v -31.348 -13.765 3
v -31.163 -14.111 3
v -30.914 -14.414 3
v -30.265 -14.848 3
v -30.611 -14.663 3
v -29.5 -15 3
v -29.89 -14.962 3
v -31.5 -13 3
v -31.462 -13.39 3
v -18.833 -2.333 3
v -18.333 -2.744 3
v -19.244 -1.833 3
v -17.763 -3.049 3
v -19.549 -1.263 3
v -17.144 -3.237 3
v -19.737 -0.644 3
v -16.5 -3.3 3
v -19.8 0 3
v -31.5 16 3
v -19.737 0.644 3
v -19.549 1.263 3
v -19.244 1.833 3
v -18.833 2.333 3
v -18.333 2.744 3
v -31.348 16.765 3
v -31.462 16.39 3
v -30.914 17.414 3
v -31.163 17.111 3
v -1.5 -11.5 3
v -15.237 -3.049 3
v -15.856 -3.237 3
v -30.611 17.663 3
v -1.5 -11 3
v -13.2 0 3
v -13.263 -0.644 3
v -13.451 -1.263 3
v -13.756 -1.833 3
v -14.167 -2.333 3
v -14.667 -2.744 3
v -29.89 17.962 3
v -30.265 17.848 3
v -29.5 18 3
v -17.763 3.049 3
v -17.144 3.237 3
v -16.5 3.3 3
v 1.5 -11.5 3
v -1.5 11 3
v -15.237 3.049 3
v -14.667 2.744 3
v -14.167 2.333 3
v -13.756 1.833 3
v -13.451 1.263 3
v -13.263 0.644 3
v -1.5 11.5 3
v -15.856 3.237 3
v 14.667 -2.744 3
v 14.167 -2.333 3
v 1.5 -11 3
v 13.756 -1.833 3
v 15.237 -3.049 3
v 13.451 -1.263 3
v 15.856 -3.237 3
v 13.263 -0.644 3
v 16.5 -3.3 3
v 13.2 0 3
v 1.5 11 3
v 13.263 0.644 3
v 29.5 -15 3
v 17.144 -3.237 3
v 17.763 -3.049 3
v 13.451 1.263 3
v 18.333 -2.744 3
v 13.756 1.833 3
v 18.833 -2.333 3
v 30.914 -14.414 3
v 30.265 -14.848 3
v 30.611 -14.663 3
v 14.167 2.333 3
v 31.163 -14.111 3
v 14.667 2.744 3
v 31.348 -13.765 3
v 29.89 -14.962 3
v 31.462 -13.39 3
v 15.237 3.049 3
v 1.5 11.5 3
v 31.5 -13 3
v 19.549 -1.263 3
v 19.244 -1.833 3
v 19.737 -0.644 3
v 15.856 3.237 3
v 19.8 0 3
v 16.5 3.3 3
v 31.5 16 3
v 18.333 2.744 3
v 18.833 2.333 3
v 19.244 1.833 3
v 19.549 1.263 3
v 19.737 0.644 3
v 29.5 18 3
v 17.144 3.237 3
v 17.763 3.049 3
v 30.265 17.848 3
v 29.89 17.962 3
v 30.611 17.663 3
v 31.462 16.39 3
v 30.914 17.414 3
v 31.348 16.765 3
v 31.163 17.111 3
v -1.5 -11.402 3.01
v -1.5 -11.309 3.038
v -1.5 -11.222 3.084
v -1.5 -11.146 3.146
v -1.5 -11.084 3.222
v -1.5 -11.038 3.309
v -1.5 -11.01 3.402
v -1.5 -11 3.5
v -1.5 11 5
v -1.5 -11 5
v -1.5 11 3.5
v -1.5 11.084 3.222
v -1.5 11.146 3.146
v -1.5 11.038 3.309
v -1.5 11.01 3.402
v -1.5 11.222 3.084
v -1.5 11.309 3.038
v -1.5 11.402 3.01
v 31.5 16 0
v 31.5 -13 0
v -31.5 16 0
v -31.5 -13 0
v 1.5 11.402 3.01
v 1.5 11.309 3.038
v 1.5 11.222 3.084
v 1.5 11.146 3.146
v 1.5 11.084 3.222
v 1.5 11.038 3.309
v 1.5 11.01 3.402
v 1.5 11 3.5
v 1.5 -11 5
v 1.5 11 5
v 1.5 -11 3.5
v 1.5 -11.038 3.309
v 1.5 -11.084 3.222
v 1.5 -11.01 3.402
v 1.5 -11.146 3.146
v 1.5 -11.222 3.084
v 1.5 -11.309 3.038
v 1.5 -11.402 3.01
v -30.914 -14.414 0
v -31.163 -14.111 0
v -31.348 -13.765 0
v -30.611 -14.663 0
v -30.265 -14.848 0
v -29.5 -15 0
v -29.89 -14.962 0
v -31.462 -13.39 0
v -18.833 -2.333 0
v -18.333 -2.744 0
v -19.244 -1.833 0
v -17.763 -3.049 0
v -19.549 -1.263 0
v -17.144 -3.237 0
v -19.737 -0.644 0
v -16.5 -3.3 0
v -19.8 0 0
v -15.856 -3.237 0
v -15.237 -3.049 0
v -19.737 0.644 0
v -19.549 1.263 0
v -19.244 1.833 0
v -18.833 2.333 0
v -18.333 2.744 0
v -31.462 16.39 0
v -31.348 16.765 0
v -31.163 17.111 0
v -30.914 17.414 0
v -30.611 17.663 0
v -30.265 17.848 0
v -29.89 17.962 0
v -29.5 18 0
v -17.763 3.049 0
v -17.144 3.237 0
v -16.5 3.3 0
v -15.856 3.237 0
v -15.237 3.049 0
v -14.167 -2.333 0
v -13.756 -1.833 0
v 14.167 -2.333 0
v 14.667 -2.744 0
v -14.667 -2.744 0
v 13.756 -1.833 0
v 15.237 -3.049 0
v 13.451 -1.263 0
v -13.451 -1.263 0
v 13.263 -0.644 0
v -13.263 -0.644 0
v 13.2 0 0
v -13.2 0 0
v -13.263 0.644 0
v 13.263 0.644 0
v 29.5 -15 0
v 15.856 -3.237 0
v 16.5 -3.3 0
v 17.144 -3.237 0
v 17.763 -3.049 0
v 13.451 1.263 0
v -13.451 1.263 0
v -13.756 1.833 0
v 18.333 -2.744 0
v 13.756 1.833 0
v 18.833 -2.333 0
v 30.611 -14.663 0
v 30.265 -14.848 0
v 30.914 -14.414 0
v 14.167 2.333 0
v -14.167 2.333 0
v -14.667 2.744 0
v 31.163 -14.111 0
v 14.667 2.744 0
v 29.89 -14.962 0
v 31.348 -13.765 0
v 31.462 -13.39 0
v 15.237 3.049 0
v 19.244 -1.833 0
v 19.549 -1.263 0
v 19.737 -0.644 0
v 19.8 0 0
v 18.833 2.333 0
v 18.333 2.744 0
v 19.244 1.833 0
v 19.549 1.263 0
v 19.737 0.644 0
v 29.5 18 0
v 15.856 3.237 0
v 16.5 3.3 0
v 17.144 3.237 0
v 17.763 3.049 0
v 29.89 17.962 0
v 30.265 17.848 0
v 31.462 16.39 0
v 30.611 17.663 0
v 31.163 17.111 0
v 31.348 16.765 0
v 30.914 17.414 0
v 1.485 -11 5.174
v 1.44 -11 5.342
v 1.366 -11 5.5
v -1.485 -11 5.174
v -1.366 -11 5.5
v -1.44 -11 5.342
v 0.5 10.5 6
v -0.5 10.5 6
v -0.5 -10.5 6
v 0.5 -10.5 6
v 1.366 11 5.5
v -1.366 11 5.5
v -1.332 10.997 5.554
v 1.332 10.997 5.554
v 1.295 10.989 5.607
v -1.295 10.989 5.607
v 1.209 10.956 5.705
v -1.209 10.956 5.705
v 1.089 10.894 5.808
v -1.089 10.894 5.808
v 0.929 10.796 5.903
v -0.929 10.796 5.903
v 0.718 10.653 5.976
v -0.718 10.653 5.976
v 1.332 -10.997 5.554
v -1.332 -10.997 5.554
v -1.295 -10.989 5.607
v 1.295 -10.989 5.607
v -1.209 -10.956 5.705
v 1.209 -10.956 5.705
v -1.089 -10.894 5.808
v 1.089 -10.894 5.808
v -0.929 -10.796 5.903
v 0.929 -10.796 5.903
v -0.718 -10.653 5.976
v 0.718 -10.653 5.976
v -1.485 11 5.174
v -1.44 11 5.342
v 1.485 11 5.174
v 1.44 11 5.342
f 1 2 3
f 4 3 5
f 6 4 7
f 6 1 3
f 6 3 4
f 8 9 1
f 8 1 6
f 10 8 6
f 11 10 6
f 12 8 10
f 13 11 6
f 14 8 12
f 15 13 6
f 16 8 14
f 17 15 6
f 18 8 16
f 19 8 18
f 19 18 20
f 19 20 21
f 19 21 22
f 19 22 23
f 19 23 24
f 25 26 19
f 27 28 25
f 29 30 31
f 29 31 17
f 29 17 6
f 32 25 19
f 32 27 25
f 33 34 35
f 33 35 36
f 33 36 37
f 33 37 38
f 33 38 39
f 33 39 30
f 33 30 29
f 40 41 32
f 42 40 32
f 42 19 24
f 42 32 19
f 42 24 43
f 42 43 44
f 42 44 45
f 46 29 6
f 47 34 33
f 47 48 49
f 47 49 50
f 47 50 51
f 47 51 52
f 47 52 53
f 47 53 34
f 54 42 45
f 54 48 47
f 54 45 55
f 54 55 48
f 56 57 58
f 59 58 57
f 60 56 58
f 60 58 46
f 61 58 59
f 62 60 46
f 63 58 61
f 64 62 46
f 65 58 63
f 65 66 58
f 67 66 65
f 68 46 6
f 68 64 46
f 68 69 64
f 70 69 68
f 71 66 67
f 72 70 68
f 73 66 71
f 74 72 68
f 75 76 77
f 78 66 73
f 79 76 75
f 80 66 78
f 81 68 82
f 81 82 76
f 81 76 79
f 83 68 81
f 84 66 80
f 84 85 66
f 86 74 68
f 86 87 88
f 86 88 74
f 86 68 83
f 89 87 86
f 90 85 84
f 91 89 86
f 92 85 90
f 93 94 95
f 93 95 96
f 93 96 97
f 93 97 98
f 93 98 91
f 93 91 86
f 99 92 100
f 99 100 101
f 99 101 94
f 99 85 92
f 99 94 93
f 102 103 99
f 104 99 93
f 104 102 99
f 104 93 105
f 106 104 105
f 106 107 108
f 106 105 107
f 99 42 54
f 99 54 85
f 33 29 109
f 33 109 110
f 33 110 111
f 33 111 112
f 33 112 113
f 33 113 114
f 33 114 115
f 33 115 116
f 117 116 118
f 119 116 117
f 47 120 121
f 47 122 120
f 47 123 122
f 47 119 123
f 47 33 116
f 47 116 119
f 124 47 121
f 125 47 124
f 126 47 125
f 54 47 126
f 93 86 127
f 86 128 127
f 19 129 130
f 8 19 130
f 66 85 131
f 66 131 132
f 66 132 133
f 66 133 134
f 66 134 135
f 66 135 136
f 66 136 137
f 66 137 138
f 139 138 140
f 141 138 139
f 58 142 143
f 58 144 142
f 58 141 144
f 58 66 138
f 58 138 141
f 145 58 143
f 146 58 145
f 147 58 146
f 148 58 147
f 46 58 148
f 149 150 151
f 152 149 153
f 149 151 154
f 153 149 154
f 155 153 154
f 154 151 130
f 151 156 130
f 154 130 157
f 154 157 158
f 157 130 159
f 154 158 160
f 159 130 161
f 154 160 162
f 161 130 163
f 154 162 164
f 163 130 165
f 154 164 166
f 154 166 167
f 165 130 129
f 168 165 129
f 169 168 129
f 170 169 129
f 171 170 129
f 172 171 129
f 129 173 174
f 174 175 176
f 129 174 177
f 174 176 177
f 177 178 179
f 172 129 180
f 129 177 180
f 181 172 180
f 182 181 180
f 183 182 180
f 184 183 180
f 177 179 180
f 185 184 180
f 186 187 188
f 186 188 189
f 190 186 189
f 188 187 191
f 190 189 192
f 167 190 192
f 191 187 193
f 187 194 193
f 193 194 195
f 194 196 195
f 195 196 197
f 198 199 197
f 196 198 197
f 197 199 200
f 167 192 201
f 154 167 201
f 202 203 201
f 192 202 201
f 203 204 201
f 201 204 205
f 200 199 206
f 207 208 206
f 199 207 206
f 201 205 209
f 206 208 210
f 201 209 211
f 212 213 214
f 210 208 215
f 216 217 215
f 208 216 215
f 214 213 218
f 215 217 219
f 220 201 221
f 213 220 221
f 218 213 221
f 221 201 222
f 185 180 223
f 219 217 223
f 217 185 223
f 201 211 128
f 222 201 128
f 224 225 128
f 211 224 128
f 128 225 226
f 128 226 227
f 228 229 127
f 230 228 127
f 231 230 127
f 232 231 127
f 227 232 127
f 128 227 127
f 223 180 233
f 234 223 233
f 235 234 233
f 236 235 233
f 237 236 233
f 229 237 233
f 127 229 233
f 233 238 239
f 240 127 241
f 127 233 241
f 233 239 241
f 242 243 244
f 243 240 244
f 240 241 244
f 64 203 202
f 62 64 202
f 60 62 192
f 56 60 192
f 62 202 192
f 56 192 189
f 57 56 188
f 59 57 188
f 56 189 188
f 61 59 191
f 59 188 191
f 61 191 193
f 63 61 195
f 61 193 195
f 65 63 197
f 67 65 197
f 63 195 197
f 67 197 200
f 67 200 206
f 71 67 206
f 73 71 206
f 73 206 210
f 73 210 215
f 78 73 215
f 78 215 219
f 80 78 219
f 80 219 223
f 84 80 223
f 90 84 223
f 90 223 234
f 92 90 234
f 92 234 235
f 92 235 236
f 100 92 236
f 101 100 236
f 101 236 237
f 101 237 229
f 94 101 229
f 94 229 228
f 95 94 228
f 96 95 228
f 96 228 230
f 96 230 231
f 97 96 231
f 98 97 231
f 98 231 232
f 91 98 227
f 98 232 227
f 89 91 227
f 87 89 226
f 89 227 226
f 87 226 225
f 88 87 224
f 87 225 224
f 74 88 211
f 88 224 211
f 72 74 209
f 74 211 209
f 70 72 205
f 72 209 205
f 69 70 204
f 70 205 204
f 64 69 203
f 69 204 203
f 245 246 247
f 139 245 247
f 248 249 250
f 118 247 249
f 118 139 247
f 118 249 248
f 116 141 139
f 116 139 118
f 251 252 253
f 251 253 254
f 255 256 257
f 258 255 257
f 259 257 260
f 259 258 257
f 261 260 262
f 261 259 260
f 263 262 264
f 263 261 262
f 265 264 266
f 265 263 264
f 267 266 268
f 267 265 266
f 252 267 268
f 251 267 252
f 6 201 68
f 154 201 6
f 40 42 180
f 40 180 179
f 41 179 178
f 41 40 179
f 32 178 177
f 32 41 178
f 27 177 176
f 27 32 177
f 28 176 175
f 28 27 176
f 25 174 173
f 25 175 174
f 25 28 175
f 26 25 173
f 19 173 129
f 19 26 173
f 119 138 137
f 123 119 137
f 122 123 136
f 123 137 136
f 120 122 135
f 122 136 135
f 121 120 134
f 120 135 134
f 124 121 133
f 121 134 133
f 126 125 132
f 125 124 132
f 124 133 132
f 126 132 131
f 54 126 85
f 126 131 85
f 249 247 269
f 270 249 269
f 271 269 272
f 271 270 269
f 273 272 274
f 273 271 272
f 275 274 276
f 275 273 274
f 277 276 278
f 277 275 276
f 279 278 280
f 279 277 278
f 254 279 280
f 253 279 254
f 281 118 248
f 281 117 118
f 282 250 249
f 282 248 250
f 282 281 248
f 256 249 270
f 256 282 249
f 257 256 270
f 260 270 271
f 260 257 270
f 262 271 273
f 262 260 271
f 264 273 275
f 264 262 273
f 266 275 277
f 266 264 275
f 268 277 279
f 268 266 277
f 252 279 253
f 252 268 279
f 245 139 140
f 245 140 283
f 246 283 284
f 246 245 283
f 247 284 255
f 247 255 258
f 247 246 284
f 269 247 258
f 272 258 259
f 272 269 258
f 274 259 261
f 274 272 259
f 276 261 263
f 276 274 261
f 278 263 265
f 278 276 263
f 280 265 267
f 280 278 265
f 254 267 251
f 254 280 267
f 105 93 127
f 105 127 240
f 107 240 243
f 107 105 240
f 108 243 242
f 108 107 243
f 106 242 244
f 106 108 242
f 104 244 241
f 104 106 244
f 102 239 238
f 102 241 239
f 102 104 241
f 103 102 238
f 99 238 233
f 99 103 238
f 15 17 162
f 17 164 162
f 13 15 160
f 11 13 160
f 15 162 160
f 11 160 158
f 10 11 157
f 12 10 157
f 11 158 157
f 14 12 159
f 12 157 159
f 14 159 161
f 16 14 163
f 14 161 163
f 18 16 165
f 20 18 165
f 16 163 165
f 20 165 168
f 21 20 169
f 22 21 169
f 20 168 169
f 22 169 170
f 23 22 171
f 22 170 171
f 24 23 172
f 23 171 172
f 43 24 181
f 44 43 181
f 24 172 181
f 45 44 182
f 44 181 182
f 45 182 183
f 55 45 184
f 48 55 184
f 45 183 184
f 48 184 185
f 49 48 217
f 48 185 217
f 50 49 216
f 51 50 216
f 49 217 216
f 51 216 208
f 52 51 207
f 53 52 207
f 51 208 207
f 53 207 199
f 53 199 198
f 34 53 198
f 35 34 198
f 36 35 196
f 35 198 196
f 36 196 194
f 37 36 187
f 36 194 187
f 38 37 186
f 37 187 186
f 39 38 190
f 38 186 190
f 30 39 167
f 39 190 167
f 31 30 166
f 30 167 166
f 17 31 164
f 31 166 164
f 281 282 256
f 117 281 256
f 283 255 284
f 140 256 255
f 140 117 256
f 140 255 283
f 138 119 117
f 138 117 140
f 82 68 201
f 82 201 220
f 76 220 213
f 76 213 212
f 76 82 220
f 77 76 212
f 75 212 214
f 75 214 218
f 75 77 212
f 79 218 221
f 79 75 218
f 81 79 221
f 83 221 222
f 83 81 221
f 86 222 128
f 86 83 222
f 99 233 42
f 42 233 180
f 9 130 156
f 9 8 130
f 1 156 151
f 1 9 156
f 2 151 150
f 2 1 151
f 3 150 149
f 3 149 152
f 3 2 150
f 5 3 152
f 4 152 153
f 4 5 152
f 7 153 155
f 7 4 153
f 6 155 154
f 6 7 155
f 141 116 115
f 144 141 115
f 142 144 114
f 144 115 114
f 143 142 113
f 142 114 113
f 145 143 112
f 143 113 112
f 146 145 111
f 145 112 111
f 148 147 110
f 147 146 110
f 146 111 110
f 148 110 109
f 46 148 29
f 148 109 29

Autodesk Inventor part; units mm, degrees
ref_plane "YZ Plane" through (0, 0, 0) normal (1, 0, 0) x (0, 1, 0)
ref_plane "XZ Plane" through (0, 0, 0) normal (0, 1, 0) x (-1, 0, 0)
ref_plane "XY Plane" through (0, 0, 0) normal (0, 0, 1) x (1, 0, 0)
sketch "スケッチ2" plane through (0, 0, 0) normal (0, 0, 1) x (1, 0, 0)
  line L0 (-31.5, 15) -> (31.5, 15)
  line L1 (31.5, 15) -> (31.5, -15)
  line L2 (31.5, -15) -> (-31.5, -15)
  line L3 (-31.5, -15) -> (-31.5, 15)
  line L4 (0, 24.6) -> (0, -21.6) construction
  line L5 (-44.1, 0) -> (44.1, 0) construction
  line L6 (-31.5, 15) -> (31.5, 15)
  line L7 (31.5, 15) -> (31.5, 18)
  line L8 (31.5, 18) -> (-31.5, 18)
  line L9 (-31.5, 18) -> (-31.5, 15)
  point P0 (0, 0)
  point P1 (31.5, 15)
  dimension "d1" = 63
  dimension "d2" = 30
  dimension "d3" = 15
  dimension "d4" = 31.5
  dimension "d26" = 3
extrude "押し出し1" add sketch "スケッチ2" along normal blind 3
sketch "スケッチ3" plane through (0, 0, 3) normal (0, 0, 1) x (1, 0, 0)
  line L0 (-31.5, -15) -> (31.5, -15) construction
  line L1 (-44.1, 0) -> (44.1, 0) construction
  line L2 (31.5, -15) -> (31.5, 18) projected
  line L3 (31.5, 18) -> (-31.5, 18) projected
  line L4 (-31.5, 18) -> (-31.5, -15) projected
  point P0 (0, 0)
  point P1 (-16.5, 0)
  point P2 (16.5, 0)
hole "穴1" at (-16.5, 0, 3) at (16.5, 0, 3) direction (0, 0, -1) diameter 6.6 end through all
fillet "フィレット1" radius 2 4 edges at (31.5, -15, 1.5) (-31.5, -15, 1.5) (-31.5, 18, 1.5) (31.5, 18, 1.5)
sketch "スケッチ4" plane through (0, 0, 3) normal (0, 0, 1) x (1, 0, 0)
  line L0 (-29.5, -15) -> (29.5, -15) projected
  arc A0 (-31.5, -13) -> (-29.5, -15) centre (-29.5, -13) ccw projected
  line L1 (-29.5, -15) -> (29.5, -15) projected
  arc A1 (29.5, -15) -> (31.5, -13) centre (29.5, -13) ccw projected
  circle A2 centre (-16.5, 0) radius 3.3 projected
  circle A3 centre (16.5, 0) radius 3.3 projected
  line L2 (1.5, -11) -> (-1.5, -11)
  line L3 (-1.5, -11) -> (-1.5, 11)
  line L4 (-1.5, 11) -> (1.5, 11)
  line L5 (1.5, 11) -> (1.5, -11)
  line L6 (1.5, -11) -> (-1.5, 11) construction
  line L7 (-1.5, -11) -> (1.5, 11) construction
  line L8 (31.5, -13) -> (31.5, 16) projected
  line L9 (29.5, 18) -> (-29.5, 18) projected
  line L10 (-31.5, 16) -> (-31.5, -13) projected
  arc A4 (31.5, 16) -> (29.5, 18) centre (29.5, 16) ccw projected
  arc A5 (-29.5, 18) -> (-31.5, 16) centre (-29.5, 16) ccw projected
  point P0 (0, 0)
  dimension "d22" = 3
  dimension "d24" = 4
extrude "押し出し2" add sketch "スケッチ4" along normal blind 3 contours L2 L3 L4 L5
fillet "フィレット2" radius 1 2 edges at (-1.5, 0, 6) (1.5, 0, 6)
fillet "フィレット2" radius 0.5 4 edges at (0, 11, 3) (0, -11, 3) (0, 11, 6) (0, -11, 6)
equation "\"d3\" = 0.5 * d2"
equation "\"d4\" = 0.5 * d1"
equation "\"d24\" = d23"
equation "\"d23\" = 4"
properties part number "rocker_frame_mount_02"
